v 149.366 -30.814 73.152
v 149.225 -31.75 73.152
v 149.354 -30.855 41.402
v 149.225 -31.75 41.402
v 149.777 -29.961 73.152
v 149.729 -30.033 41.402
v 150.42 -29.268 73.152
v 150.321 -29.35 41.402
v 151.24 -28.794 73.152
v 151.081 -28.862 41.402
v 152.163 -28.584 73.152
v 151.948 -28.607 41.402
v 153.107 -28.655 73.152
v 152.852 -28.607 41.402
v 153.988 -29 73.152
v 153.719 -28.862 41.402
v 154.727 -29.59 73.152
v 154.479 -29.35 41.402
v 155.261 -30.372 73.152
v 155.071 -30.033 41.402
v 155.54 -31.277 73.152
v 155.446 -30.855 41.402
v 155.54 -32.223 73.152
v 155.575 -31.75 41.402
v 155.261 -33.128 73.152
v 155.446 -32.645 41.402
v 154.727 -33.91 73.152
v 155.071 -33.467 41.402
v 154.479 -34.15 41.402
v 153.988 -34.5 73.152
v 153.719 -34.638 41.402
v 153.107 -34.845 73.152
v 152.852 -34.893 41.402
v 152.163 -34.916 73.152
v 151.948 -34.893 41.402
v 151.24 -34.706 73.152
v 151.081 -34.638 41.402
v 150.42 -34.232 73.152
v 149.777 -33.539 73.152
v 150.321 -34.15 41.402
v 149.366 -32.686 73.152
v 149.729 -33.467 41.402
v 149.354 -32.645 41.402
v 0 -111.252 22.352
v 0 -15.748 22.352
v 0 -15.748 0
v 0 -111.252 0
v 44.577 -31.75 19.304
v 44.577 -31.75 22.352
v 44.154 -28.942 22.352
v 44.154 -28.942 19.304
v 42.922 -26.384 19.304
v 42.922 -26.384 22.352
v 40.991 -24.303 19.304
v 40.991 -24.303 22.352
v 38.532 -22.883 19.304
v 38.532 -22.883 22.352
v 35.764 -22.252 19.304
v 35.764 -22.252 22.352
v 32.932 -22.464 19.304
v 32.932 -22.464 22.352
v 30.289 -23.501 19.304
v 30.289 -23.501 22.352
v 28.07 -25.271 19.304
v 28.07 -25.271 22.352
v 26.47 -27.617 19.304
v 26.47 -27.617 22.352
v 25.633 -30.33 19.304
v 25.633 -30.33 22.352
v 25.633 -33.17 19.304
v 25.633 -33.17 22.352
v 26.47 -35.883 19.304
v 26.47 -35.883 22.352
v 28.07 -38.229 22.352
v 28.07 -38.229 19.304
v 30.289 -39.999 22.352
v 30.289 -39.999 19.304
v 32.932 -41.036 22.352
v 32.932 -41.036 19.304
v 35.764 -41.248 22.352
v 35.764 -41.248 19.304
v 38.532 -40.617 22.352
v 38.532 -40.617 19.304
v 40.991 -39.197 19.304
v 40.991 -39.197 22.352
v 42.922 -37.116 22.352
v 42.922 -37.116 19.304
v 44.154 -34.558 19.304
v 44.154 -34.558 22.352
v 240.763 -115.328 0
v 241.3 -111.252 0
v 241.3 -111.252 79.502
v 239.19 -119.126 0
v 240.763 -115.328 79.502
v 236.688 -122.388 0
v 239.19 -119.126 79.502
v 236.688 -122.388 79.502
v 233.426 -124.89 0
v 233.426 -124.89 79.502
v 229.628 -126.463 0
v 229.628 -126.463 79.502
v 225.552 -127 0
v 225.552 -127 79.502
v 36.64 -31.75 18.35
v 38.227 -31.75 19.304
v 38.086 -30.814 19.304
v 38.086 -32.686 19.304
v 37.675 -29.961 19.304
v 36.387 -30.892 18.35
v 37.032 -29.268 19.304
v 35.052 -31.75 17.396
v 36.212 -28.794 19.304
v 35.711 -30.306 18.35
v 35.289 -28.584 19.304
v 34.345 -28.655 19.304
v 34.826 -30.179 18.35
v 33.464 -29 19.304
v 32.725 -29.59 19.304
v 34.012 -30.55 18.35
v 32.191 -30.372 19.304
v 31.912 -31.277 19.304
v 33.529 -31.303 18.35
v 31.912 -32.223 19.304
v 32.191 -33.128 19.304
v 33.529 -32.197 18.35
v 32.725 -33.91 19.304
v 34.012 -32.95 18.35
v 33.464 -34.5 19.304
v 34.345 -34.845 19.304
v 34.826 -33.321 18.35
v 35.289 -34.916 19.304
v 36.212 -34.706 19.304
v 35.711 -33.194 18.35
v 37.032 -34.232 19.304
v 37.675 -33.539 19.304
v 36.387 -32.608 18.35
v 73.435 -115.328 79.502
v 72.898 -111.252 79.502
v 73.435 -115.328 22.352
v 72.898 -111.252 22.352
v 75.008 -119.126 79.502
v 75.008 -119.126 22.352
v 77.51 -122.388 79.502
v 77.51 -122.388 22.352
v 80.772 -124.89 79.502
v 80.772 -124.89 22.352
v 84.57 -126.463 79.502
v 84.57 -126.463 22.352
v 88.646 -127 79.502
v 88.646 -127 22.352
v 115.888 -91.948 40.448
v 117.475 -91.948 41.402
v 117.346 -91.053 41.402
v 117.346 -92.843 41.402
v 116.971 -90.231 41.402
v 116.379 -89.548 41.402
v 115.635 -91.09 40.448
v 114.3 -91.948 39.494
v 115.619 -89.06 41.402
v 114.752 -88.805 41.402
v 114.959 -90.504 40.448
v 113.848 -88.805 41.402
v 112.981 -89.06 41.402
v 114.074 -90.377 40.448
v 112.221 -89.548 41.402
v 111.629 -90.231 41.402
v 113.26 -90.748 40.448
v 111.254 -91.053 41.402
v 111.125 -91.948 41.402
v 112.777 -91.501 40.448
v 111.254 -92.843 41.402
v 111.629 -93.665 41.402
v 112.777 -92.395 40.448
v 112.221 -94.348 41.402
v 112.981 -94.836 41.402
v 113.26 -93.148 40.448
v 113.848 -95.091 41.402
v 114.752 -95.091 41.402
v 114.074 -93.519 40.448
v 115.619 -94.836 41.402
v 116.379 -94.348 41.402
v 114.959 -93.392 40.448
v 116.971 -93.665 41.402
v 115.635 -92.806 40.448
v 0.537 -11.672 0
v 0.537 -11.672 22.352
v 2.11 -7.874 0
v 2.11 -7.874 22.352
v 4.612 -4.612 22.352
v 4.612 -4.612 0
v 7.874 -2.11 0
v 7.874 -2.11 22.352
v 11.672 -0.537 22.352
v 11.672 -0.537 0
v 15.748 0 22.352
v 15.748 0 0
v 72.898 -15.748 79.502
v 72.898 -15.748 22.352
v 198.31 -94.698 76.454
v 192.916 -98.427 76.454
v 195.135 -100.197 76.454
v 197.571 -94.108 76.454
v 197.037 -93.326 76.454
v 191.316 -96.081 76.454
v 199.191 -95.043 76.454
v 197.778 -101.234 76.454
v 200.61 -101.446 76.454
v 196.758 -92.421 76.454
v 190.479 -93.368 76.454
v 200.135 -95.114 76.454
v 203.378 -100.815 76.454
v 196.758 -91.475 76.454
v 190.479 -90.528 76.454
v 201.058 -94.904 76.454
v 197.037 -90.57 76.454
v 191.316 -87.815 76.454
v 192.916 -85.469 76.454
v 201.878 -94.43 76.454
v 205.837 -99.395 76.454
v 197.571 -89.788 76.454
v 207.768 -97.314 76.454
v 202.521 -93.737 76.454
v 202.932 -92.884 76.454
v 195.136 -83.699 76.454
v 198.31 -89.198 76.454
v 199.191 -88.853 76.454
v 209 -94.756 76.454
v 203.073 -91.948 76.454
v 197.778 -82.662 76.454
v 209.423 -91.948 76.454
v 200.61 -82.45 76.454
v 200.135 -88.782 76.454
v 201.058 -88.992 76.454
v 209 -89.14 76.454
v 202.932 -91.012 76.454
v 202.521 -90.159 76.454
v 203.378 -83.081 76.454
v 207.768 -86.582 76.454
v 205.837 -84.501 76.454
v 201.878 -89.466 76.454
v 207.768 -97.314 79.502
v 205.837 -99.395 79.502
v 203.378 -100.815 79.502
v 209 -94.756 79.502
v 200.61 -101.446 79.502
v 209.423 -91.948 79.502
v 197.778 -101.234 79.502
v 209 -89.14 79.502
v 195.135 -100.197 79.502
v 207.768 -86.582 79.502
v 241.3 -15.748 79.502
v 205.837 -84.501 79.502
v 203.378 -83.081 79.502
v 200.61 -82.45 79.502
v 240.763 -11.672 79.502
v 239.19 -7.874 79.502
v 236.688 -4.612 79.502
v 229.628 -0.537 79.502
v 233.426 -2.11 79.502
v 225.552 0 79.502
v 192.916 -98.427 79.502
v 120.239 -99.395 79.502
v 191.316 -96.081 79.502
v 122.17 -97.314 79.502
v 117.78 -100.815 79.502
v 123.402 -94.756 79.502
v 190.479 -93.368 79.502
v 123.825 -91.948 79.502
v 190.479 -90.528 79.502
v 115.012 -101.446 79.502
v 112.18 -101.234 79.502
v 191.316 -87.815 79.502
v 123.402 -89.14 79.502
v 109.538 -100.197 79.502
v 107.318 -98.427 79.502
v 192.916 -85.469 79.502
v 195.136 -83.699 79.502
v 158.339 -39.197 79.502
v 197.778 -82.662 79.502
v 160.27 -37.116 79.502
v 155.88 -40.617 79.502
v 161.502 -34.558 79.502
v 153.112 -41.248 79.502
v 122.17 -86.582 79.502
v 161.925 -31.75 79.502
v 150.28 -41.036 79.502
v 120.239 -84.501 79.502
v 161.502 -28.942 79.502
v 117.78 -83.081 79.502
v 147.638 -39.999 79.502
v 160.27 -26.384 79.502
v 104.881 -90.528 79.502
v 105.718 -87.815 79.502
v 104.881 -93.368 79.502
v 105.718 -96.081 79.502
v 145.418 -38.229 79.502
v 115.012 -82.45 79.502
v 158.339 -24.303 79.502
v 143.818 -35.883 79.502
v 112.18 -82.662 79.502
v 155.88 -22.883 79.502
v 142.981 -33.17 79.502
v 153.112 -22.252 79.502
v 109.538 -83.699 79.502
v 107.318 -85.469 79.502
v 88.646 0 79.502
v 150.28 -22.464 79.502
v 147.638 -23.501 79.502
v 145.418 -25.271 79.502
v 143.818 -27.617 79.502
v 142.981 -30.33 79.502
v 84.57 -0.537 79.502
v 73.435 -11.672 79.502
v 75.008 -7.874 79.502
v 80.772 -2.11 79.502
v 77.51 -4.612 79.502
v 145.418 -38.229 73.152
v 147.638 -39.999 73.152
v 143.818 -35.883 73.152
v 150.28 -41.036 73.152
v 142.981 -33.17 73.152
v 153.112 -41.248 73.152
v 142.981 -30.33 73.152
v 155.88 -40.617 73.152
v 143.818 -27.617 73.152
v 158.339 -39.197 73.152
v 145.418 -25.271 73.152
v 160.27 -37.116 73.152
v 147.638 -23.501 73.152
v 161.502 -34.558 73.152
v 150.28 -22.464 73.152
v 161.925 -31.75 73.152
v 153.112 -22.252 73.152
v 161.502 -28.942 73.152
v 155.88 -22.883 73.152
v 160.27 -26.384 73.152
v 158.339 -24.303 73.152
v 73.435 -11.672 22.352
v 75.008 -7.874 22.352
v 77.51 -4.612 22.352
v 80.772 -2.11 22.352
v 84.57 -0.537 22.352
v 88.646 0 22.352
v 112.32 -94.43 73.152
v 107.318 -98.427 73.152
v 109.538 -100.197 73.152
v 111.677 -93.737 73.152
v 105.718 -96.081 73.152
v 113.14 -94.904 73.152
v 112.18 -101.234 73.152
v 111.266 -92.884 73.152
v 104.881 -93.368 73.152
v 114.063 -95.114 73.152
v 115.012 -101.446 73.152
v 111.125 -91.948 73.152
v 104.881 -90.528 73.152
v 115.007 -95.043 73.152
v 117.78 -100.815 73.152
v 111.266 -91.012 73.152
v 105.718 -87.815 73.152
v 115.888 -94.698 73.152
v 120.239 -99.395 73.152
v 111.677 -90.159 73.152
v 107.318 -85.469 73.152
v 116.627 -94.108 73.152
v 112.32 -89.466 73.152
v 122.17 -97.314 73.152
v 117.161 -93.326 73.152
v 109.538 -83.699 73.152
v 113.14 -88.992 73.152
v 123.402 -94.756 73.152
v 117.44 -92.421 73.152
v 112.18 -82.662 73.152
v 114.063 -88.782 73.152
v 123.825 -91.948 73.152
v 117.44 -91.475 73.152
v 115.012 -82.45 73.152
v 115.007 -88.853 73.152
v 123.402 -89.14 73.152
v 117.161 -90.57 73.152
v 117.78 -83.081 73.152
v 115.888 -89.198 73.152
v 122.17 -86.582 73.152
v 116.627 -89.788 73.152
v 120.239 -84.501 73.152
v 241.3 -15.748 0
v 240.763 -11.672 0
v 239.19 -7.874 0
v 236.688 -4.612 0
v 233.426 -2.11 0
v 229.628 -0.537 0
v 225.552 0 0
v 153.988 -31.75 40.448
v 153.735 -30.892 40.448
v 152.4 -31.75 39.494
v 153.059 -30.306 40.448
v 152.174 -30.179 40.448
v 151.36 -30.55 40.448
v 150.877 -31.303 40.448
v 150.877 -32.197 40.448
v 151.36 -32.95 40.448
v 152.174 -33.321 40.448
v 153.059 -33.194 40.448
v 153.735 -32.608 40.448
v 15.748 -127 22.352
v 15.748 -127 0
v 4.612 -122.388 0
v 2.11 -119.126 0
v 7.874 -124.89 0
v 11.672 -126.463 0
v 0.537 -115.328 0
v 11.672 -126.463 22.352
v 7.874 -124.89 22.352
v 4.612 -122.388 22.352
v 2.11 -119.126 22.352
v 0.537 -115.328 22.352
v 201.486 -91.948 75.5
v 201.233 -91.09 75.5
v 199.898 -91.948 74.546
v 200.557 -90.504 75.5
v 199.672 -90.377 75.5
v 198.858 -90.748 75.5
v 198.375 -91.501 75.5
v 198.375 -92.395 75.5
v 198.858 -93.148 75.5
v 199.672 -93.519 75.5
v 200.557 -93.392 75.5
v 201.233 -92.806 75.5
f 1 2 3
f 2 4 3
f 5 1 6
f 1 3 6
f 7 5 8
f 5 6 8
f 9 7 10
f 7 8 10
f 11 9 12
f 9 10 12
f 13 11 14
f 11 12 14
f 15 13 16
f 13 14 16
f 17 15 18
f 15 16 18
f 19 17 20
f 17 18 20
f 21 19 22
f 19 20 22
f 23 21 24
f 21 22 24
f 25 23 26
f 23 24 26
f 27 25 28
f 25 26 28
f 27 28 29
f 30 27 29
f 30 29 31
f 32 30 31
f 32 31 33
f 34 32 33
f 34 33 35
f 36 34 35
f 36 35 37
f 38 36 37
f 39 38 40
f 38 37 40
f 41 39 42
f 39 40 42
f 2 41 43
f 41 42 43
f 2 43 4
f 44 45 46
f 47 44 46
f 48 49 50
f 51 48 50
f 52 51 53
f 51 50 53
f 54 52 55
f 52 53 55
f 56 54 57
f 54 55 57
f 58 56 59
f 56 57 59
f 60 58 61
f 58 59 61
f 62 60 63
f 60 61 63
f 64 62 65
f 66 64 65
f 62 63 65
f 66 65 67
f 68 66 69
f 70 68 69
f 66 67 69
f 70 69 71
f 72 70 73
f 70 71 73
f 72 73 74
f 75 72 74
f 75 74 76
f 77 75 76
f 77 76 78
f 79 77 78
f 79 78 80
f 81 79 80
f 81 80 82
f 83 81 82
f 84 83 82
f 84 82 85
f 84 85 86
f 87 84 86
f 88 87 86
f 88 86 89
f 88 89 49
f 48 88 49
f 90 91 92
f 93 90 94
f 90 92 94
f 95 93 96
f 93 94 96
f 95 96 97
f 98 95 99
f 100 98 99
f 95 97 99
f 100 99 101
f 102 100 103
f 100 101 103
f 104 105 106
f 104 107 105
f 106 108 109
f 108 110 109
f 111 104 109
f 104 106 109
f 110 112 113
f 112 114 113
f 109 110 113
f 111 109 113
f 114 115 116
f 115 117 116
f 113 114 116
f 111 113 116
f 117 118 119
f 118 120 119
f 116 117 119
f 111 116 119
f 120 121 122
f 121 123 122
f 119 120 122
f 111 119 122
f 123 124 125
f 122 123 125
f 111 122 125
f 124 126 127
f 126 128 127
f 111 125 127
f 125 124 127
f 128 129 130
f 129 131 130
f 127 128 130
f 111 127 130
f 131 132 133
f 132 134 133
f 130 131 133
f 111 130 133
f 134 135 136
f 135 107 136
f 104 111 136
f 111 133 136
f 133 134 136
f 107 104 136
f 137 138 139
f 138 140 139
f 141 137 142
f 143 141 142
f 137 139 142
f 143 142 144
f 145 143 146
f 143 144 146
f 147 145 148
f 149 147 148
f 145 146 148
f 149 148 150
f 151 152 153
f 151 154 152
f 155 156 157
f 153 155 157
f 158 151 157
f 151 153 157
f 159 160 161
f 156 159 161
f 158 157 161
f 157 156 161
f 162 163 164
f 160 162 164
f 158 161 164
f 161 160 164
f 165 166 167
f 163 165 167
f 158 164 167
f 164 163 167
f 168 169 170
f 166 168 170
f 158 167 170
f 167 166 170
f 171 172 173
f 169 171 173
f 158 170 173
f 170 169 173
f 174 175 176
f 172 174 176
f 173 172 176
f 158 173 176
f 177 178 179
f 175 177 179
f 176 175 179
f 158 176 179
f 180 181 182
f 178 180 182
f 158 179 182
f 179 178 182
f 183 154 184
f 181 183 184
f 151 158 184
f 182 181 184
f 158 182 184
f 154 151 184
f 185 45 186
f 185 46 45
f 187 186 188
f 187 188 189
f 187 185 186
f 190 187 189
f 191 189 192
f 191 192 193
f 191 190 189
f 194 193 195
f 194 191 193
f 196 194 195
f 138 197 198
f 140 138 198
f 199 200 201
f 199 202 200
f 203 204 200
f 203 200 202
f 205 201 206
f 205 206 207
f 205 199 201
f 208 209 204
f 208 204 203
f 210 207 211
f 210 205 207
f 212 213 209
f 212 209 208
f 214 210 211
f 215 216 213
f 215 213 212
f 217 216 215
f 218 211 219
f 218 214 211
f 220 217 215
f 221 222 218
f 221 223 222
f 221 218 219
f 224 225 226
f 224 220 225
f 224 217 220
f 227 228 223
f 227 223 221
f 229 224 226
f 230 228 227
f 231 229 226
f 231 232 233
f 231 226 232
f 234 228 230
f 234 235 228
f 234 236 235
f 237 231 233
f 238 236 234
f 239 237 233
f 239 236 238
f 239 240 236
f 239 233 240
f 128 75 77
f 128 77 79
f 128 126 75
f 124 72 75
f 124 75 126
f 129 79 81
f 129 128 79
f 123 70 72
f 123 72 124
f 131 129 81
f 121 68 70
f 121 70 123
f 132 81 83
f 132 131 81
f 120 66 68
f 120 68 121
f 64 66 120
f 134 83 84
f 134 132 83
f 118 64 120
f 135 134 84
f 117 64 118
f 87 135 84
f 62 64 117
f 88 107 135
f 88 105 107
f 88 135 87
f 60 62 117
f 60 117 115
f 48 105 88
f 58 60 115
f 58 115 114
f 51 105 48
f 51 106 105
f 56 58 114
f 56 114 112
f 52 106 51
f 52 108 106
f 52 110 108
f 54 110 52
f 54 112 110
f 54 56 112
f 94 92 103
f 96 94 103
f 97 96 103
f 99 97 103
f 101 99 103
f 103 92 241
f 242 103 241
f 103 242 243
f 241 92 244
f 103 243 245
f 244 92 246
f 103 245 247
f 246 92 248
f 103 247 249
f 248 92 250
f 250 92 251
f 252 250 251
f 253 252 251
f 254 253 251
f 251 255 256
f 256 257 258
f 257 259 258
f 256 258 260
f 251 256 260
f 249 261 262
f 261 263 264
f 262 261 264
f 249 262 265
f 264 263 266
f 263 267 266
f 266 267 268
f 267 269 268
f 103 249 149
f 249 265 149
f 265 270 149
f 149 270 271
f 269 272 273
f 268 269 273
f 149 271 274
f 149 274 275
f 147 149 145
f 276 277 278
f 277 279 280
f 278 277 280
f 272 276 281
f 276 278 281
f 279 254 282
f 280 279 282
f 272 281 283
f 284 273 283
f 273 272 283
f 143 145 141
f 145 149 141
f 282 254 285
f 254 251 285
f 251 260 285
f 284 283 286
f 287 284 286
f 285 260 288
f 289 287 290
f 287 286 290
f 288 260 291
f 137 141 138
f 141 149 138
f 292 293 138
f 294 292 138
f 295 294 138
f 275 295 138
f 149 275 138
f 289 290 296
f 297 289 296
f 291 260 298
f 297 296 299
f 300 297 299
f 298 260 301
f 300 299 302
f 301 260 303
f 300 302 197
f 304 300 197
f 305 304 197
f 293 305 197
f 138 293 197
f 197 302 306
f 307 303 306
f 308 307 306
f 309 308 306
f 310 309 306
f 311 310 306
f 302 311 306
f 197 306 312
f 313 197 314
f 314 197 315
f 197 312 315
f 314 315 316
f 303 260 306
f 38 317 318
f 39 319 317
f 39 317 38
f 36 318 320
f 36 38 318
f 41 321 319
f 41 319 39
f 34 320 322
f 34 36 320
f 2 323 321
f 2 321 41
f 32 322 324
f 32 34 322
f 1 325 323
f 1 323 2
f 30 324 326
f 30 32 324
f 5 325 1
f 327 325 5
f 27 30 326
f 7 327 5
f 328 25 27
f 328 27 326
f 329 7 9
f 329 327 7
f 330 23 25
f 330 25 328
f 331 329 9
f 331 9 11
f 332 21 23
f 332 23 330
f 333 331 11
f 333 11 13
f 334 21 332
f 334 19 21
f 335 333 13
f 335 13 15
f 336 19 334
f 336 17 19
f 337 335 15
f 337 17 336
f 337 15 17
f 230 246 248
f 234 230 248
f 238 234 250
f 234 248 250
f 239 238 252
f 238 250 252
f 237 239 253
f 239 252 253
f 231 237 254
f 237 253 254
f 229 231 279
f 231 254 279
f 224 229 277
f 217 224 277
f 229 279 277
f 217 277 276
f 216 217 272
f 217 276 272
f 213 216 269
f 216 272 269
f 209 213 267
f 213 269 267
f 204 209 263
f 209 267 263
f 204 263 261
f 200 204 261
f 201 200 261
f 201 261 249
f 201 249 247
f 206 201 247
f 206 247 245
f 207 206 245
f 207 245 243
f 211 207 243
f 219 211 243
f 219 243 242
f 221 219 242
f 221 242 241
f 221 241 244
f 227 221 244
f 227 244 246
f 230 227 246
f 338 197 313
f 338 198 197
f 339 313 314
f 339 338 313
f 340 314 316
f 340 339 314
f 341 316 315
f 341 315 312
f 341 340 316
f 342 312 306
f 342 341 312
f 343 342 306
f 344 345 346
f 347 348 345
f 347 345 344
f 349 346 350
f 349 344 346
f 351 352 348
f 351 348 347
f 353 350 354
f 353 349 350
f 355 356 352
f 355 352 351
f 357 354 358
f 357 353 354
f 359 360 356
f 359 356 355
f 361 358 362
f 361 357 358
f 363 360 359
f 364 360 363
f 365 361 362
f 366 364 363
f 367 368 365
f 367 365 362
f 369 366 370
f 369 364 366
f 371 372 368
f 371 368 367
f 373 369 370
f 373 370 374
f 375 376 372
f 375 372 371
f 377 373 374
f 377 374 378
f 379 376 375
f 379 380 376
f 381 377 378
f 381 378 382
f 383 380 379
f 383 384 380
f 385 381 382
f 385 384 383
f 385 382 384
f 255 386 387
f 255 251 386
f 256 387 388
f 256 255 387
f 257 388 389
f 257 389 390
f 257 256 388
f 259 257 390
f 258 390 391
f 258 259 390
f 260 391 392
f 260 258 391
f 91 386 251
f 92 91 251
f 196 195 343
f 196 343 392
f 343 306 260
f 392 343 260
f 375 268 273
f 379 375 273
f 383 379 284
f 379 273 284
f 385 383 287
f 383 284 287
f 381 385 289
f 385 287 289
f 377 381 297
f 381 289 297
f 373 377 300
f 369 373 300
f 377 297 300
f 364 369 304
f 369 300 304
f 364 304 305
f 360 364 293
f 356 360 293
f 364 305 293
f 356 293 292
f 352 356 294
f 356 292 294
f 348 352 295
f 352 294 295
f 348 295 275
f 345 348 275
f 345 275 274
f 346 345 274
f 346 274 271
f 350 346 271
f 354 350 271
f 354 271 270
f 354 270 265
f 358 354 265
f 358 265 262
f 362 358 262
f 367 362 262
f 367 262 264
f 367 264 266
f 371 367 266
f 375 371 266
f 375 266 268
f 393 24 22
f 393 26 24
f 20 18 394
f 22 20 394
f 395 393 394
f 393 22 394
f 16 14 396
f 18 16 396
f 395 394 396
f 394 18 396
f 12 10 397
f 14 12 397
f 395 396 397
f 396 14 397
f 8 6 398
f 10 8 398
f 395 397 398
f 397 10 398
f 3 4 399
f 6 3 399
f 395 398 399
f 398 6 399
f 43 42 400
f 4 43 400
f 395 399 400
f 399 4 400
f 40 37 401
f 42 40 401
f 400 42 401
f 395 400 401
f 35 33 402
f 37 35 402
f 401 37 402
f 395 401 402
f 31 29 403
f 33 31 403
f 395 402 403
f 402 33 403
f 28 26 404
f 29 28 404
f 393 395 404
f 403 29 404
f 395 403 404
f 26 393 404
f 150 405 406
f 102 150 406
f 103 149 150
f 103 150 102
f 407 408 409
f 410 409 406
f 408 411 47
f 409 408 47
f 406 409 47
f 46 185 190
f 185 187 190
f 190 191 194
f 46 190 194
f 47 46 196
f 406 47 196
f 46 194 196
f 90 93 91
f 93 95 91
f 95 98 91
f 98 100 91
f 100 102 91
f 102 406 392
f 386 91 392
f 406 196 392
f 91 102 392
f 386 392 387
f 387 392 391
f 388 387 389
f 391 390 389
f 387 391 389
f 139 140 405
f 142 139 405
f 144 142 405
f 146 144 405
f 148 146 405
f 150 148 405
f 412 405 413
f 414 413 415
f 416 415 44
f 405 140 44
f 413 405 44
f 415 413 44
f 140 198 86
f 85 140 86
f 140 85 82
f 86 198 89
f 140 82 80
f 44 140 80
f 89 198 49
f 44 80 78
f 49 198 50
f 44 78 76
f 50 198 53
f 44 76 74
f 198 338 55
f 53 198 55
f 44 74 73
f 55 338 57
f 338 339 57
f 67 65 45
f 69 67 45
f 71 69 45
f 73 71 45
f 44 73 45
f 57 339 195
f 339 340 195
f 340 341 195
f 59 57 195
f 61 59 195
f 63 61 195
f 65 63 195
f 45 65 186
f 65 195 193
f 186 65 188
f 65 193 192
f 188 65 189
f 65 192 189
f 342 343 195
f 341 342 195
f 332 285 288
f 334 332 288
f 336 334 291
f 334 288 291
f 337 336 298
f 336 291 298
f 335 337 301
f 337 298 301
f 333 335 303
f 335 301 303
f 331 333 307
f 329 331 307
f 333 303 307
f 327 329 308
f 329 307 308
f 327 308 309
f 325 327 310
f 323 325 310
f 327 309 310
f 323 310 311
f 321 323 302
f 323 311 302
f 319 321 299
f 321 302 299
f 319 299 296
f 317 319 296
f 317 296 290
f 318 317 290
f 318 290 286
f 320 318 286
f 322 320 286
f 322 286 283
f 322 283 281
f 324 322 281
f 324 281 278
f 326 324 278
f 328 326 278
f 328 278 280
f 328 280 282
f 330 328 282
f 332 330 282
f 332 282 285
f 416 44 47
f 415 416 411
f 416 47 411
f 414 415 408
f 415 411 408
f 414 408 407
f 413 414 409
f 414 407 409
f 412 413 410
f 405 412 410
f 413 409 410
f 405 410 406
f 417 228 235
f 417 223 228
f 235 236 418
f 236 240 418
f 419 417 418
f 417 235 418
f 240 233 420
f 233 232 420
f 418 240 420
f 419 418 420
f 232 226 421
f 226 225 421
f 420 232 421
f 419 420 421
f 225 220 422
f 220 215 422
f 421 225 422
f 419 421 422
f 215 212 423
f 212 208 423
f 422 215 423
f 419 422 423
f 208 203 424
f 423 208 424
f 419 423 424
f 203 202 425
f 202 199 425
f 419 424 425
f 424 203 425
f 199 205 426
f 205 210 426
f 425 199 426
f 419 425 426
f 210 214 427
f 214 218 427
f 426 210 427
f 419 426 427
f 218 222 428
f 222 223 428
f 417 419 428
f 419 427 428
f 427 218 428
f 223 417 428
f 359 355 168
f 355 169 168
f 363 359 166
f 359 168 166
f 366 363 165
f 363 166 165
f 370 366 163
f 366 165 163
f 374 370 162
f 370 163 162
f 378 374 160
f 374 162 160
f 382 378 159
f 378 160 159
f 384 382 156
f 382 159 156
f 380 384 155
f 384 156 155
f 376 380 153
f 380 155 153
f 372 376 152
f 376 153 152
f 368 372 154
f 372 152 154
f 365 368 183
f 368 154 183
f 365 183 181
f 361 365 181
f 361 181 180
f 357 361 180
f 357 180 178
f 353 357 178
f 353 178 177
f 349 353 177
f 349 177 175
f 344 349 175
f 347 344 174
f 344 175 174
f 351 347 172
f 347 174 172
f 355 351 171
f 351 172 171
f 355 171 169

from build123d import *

# Parameters (mm, degrees)
F1_DEPTH       = 127
F2_R           = 15.748
F4_D           = 6.35
F4_DEPTH       = 38.1
F4_CBORE_D     = 19.05
F4_CBORE_DEPTH = 6.35
F4_TIP         = 1.9077324654
F5_D           = 6.35
F5_DEPTH       = 3.048
F5_START       = 57.15
F5_CBORE_D     = 19.05
F5_CBORE_DEPTH = 3.048
F5_TIP         = 1.9077324654


with BuildPart() as f1:
    # F0 (on Front) → F1 (new body)
    with BuildSketch(Plane.XZ):
        Polygon((0, 22.352), (0, 0), (241.3, 0), (241.3, 79.502), (72.898, 79.502), (72.898, 22.352), align=None)
    extrude(amount=F1_DEPTH)

    # F2
    f2_edges = [f1.edges().sort_by_distance(p)[0] for p in [
        (0, -127, 11.176),
        (0, 0, 11.176),
        (72.898, -127, 50.927),
        (72.898, 0, 50.927),
        (241.3, -127, 39.751),
        (241.3, 0, 39.751),
    ]]
    fillet(f2_edges, radius=F2_R)

    # F4
    with Locations(Plane.XY.offset(79.502)):
        with Locations((152.4, -31.75), (114.3, -91.948)):
            CounterBoreHole(F4_D / 2, F4_CBORE_D / 2, F4_CBORE_DEPTH, depth=F4_DEPTH)
            with Locations((0, 0, -(F4_DEPTH + F4_TIP / 2))):  # 118° drill point
                Cone(0, F4_D / 2, F4_TIP, mode=Mode.SUBTRACT)

    # F5
    # its depths count from where the whole tool has entered the part; down to there all is cleared
    with Locations(Plane.XY.offset(79.502)):
        with Locations((35.052, -31.75)):
            Hole(F5_CBORE_D / 2, depth=F5_START)
    with Locations(Plane.XY.offset(79.502)):
        with Locations((199.898, -91.948, 0), (35.052, -31.75, -F5_START)):
            CounterBoreHole(F5_D / 2, F5_CBORE_D / 2, F5_CBORE_DEPTH, depth=F5_DEPTH)
            with Locations((0, 0, -(F5_DEPTH + F5_TIP / 2))):  # 118° drill point
                Cone(0, F5_D / 2, F5_TIP, mode=Mode.SUBTRACT)


solid = f1.part
